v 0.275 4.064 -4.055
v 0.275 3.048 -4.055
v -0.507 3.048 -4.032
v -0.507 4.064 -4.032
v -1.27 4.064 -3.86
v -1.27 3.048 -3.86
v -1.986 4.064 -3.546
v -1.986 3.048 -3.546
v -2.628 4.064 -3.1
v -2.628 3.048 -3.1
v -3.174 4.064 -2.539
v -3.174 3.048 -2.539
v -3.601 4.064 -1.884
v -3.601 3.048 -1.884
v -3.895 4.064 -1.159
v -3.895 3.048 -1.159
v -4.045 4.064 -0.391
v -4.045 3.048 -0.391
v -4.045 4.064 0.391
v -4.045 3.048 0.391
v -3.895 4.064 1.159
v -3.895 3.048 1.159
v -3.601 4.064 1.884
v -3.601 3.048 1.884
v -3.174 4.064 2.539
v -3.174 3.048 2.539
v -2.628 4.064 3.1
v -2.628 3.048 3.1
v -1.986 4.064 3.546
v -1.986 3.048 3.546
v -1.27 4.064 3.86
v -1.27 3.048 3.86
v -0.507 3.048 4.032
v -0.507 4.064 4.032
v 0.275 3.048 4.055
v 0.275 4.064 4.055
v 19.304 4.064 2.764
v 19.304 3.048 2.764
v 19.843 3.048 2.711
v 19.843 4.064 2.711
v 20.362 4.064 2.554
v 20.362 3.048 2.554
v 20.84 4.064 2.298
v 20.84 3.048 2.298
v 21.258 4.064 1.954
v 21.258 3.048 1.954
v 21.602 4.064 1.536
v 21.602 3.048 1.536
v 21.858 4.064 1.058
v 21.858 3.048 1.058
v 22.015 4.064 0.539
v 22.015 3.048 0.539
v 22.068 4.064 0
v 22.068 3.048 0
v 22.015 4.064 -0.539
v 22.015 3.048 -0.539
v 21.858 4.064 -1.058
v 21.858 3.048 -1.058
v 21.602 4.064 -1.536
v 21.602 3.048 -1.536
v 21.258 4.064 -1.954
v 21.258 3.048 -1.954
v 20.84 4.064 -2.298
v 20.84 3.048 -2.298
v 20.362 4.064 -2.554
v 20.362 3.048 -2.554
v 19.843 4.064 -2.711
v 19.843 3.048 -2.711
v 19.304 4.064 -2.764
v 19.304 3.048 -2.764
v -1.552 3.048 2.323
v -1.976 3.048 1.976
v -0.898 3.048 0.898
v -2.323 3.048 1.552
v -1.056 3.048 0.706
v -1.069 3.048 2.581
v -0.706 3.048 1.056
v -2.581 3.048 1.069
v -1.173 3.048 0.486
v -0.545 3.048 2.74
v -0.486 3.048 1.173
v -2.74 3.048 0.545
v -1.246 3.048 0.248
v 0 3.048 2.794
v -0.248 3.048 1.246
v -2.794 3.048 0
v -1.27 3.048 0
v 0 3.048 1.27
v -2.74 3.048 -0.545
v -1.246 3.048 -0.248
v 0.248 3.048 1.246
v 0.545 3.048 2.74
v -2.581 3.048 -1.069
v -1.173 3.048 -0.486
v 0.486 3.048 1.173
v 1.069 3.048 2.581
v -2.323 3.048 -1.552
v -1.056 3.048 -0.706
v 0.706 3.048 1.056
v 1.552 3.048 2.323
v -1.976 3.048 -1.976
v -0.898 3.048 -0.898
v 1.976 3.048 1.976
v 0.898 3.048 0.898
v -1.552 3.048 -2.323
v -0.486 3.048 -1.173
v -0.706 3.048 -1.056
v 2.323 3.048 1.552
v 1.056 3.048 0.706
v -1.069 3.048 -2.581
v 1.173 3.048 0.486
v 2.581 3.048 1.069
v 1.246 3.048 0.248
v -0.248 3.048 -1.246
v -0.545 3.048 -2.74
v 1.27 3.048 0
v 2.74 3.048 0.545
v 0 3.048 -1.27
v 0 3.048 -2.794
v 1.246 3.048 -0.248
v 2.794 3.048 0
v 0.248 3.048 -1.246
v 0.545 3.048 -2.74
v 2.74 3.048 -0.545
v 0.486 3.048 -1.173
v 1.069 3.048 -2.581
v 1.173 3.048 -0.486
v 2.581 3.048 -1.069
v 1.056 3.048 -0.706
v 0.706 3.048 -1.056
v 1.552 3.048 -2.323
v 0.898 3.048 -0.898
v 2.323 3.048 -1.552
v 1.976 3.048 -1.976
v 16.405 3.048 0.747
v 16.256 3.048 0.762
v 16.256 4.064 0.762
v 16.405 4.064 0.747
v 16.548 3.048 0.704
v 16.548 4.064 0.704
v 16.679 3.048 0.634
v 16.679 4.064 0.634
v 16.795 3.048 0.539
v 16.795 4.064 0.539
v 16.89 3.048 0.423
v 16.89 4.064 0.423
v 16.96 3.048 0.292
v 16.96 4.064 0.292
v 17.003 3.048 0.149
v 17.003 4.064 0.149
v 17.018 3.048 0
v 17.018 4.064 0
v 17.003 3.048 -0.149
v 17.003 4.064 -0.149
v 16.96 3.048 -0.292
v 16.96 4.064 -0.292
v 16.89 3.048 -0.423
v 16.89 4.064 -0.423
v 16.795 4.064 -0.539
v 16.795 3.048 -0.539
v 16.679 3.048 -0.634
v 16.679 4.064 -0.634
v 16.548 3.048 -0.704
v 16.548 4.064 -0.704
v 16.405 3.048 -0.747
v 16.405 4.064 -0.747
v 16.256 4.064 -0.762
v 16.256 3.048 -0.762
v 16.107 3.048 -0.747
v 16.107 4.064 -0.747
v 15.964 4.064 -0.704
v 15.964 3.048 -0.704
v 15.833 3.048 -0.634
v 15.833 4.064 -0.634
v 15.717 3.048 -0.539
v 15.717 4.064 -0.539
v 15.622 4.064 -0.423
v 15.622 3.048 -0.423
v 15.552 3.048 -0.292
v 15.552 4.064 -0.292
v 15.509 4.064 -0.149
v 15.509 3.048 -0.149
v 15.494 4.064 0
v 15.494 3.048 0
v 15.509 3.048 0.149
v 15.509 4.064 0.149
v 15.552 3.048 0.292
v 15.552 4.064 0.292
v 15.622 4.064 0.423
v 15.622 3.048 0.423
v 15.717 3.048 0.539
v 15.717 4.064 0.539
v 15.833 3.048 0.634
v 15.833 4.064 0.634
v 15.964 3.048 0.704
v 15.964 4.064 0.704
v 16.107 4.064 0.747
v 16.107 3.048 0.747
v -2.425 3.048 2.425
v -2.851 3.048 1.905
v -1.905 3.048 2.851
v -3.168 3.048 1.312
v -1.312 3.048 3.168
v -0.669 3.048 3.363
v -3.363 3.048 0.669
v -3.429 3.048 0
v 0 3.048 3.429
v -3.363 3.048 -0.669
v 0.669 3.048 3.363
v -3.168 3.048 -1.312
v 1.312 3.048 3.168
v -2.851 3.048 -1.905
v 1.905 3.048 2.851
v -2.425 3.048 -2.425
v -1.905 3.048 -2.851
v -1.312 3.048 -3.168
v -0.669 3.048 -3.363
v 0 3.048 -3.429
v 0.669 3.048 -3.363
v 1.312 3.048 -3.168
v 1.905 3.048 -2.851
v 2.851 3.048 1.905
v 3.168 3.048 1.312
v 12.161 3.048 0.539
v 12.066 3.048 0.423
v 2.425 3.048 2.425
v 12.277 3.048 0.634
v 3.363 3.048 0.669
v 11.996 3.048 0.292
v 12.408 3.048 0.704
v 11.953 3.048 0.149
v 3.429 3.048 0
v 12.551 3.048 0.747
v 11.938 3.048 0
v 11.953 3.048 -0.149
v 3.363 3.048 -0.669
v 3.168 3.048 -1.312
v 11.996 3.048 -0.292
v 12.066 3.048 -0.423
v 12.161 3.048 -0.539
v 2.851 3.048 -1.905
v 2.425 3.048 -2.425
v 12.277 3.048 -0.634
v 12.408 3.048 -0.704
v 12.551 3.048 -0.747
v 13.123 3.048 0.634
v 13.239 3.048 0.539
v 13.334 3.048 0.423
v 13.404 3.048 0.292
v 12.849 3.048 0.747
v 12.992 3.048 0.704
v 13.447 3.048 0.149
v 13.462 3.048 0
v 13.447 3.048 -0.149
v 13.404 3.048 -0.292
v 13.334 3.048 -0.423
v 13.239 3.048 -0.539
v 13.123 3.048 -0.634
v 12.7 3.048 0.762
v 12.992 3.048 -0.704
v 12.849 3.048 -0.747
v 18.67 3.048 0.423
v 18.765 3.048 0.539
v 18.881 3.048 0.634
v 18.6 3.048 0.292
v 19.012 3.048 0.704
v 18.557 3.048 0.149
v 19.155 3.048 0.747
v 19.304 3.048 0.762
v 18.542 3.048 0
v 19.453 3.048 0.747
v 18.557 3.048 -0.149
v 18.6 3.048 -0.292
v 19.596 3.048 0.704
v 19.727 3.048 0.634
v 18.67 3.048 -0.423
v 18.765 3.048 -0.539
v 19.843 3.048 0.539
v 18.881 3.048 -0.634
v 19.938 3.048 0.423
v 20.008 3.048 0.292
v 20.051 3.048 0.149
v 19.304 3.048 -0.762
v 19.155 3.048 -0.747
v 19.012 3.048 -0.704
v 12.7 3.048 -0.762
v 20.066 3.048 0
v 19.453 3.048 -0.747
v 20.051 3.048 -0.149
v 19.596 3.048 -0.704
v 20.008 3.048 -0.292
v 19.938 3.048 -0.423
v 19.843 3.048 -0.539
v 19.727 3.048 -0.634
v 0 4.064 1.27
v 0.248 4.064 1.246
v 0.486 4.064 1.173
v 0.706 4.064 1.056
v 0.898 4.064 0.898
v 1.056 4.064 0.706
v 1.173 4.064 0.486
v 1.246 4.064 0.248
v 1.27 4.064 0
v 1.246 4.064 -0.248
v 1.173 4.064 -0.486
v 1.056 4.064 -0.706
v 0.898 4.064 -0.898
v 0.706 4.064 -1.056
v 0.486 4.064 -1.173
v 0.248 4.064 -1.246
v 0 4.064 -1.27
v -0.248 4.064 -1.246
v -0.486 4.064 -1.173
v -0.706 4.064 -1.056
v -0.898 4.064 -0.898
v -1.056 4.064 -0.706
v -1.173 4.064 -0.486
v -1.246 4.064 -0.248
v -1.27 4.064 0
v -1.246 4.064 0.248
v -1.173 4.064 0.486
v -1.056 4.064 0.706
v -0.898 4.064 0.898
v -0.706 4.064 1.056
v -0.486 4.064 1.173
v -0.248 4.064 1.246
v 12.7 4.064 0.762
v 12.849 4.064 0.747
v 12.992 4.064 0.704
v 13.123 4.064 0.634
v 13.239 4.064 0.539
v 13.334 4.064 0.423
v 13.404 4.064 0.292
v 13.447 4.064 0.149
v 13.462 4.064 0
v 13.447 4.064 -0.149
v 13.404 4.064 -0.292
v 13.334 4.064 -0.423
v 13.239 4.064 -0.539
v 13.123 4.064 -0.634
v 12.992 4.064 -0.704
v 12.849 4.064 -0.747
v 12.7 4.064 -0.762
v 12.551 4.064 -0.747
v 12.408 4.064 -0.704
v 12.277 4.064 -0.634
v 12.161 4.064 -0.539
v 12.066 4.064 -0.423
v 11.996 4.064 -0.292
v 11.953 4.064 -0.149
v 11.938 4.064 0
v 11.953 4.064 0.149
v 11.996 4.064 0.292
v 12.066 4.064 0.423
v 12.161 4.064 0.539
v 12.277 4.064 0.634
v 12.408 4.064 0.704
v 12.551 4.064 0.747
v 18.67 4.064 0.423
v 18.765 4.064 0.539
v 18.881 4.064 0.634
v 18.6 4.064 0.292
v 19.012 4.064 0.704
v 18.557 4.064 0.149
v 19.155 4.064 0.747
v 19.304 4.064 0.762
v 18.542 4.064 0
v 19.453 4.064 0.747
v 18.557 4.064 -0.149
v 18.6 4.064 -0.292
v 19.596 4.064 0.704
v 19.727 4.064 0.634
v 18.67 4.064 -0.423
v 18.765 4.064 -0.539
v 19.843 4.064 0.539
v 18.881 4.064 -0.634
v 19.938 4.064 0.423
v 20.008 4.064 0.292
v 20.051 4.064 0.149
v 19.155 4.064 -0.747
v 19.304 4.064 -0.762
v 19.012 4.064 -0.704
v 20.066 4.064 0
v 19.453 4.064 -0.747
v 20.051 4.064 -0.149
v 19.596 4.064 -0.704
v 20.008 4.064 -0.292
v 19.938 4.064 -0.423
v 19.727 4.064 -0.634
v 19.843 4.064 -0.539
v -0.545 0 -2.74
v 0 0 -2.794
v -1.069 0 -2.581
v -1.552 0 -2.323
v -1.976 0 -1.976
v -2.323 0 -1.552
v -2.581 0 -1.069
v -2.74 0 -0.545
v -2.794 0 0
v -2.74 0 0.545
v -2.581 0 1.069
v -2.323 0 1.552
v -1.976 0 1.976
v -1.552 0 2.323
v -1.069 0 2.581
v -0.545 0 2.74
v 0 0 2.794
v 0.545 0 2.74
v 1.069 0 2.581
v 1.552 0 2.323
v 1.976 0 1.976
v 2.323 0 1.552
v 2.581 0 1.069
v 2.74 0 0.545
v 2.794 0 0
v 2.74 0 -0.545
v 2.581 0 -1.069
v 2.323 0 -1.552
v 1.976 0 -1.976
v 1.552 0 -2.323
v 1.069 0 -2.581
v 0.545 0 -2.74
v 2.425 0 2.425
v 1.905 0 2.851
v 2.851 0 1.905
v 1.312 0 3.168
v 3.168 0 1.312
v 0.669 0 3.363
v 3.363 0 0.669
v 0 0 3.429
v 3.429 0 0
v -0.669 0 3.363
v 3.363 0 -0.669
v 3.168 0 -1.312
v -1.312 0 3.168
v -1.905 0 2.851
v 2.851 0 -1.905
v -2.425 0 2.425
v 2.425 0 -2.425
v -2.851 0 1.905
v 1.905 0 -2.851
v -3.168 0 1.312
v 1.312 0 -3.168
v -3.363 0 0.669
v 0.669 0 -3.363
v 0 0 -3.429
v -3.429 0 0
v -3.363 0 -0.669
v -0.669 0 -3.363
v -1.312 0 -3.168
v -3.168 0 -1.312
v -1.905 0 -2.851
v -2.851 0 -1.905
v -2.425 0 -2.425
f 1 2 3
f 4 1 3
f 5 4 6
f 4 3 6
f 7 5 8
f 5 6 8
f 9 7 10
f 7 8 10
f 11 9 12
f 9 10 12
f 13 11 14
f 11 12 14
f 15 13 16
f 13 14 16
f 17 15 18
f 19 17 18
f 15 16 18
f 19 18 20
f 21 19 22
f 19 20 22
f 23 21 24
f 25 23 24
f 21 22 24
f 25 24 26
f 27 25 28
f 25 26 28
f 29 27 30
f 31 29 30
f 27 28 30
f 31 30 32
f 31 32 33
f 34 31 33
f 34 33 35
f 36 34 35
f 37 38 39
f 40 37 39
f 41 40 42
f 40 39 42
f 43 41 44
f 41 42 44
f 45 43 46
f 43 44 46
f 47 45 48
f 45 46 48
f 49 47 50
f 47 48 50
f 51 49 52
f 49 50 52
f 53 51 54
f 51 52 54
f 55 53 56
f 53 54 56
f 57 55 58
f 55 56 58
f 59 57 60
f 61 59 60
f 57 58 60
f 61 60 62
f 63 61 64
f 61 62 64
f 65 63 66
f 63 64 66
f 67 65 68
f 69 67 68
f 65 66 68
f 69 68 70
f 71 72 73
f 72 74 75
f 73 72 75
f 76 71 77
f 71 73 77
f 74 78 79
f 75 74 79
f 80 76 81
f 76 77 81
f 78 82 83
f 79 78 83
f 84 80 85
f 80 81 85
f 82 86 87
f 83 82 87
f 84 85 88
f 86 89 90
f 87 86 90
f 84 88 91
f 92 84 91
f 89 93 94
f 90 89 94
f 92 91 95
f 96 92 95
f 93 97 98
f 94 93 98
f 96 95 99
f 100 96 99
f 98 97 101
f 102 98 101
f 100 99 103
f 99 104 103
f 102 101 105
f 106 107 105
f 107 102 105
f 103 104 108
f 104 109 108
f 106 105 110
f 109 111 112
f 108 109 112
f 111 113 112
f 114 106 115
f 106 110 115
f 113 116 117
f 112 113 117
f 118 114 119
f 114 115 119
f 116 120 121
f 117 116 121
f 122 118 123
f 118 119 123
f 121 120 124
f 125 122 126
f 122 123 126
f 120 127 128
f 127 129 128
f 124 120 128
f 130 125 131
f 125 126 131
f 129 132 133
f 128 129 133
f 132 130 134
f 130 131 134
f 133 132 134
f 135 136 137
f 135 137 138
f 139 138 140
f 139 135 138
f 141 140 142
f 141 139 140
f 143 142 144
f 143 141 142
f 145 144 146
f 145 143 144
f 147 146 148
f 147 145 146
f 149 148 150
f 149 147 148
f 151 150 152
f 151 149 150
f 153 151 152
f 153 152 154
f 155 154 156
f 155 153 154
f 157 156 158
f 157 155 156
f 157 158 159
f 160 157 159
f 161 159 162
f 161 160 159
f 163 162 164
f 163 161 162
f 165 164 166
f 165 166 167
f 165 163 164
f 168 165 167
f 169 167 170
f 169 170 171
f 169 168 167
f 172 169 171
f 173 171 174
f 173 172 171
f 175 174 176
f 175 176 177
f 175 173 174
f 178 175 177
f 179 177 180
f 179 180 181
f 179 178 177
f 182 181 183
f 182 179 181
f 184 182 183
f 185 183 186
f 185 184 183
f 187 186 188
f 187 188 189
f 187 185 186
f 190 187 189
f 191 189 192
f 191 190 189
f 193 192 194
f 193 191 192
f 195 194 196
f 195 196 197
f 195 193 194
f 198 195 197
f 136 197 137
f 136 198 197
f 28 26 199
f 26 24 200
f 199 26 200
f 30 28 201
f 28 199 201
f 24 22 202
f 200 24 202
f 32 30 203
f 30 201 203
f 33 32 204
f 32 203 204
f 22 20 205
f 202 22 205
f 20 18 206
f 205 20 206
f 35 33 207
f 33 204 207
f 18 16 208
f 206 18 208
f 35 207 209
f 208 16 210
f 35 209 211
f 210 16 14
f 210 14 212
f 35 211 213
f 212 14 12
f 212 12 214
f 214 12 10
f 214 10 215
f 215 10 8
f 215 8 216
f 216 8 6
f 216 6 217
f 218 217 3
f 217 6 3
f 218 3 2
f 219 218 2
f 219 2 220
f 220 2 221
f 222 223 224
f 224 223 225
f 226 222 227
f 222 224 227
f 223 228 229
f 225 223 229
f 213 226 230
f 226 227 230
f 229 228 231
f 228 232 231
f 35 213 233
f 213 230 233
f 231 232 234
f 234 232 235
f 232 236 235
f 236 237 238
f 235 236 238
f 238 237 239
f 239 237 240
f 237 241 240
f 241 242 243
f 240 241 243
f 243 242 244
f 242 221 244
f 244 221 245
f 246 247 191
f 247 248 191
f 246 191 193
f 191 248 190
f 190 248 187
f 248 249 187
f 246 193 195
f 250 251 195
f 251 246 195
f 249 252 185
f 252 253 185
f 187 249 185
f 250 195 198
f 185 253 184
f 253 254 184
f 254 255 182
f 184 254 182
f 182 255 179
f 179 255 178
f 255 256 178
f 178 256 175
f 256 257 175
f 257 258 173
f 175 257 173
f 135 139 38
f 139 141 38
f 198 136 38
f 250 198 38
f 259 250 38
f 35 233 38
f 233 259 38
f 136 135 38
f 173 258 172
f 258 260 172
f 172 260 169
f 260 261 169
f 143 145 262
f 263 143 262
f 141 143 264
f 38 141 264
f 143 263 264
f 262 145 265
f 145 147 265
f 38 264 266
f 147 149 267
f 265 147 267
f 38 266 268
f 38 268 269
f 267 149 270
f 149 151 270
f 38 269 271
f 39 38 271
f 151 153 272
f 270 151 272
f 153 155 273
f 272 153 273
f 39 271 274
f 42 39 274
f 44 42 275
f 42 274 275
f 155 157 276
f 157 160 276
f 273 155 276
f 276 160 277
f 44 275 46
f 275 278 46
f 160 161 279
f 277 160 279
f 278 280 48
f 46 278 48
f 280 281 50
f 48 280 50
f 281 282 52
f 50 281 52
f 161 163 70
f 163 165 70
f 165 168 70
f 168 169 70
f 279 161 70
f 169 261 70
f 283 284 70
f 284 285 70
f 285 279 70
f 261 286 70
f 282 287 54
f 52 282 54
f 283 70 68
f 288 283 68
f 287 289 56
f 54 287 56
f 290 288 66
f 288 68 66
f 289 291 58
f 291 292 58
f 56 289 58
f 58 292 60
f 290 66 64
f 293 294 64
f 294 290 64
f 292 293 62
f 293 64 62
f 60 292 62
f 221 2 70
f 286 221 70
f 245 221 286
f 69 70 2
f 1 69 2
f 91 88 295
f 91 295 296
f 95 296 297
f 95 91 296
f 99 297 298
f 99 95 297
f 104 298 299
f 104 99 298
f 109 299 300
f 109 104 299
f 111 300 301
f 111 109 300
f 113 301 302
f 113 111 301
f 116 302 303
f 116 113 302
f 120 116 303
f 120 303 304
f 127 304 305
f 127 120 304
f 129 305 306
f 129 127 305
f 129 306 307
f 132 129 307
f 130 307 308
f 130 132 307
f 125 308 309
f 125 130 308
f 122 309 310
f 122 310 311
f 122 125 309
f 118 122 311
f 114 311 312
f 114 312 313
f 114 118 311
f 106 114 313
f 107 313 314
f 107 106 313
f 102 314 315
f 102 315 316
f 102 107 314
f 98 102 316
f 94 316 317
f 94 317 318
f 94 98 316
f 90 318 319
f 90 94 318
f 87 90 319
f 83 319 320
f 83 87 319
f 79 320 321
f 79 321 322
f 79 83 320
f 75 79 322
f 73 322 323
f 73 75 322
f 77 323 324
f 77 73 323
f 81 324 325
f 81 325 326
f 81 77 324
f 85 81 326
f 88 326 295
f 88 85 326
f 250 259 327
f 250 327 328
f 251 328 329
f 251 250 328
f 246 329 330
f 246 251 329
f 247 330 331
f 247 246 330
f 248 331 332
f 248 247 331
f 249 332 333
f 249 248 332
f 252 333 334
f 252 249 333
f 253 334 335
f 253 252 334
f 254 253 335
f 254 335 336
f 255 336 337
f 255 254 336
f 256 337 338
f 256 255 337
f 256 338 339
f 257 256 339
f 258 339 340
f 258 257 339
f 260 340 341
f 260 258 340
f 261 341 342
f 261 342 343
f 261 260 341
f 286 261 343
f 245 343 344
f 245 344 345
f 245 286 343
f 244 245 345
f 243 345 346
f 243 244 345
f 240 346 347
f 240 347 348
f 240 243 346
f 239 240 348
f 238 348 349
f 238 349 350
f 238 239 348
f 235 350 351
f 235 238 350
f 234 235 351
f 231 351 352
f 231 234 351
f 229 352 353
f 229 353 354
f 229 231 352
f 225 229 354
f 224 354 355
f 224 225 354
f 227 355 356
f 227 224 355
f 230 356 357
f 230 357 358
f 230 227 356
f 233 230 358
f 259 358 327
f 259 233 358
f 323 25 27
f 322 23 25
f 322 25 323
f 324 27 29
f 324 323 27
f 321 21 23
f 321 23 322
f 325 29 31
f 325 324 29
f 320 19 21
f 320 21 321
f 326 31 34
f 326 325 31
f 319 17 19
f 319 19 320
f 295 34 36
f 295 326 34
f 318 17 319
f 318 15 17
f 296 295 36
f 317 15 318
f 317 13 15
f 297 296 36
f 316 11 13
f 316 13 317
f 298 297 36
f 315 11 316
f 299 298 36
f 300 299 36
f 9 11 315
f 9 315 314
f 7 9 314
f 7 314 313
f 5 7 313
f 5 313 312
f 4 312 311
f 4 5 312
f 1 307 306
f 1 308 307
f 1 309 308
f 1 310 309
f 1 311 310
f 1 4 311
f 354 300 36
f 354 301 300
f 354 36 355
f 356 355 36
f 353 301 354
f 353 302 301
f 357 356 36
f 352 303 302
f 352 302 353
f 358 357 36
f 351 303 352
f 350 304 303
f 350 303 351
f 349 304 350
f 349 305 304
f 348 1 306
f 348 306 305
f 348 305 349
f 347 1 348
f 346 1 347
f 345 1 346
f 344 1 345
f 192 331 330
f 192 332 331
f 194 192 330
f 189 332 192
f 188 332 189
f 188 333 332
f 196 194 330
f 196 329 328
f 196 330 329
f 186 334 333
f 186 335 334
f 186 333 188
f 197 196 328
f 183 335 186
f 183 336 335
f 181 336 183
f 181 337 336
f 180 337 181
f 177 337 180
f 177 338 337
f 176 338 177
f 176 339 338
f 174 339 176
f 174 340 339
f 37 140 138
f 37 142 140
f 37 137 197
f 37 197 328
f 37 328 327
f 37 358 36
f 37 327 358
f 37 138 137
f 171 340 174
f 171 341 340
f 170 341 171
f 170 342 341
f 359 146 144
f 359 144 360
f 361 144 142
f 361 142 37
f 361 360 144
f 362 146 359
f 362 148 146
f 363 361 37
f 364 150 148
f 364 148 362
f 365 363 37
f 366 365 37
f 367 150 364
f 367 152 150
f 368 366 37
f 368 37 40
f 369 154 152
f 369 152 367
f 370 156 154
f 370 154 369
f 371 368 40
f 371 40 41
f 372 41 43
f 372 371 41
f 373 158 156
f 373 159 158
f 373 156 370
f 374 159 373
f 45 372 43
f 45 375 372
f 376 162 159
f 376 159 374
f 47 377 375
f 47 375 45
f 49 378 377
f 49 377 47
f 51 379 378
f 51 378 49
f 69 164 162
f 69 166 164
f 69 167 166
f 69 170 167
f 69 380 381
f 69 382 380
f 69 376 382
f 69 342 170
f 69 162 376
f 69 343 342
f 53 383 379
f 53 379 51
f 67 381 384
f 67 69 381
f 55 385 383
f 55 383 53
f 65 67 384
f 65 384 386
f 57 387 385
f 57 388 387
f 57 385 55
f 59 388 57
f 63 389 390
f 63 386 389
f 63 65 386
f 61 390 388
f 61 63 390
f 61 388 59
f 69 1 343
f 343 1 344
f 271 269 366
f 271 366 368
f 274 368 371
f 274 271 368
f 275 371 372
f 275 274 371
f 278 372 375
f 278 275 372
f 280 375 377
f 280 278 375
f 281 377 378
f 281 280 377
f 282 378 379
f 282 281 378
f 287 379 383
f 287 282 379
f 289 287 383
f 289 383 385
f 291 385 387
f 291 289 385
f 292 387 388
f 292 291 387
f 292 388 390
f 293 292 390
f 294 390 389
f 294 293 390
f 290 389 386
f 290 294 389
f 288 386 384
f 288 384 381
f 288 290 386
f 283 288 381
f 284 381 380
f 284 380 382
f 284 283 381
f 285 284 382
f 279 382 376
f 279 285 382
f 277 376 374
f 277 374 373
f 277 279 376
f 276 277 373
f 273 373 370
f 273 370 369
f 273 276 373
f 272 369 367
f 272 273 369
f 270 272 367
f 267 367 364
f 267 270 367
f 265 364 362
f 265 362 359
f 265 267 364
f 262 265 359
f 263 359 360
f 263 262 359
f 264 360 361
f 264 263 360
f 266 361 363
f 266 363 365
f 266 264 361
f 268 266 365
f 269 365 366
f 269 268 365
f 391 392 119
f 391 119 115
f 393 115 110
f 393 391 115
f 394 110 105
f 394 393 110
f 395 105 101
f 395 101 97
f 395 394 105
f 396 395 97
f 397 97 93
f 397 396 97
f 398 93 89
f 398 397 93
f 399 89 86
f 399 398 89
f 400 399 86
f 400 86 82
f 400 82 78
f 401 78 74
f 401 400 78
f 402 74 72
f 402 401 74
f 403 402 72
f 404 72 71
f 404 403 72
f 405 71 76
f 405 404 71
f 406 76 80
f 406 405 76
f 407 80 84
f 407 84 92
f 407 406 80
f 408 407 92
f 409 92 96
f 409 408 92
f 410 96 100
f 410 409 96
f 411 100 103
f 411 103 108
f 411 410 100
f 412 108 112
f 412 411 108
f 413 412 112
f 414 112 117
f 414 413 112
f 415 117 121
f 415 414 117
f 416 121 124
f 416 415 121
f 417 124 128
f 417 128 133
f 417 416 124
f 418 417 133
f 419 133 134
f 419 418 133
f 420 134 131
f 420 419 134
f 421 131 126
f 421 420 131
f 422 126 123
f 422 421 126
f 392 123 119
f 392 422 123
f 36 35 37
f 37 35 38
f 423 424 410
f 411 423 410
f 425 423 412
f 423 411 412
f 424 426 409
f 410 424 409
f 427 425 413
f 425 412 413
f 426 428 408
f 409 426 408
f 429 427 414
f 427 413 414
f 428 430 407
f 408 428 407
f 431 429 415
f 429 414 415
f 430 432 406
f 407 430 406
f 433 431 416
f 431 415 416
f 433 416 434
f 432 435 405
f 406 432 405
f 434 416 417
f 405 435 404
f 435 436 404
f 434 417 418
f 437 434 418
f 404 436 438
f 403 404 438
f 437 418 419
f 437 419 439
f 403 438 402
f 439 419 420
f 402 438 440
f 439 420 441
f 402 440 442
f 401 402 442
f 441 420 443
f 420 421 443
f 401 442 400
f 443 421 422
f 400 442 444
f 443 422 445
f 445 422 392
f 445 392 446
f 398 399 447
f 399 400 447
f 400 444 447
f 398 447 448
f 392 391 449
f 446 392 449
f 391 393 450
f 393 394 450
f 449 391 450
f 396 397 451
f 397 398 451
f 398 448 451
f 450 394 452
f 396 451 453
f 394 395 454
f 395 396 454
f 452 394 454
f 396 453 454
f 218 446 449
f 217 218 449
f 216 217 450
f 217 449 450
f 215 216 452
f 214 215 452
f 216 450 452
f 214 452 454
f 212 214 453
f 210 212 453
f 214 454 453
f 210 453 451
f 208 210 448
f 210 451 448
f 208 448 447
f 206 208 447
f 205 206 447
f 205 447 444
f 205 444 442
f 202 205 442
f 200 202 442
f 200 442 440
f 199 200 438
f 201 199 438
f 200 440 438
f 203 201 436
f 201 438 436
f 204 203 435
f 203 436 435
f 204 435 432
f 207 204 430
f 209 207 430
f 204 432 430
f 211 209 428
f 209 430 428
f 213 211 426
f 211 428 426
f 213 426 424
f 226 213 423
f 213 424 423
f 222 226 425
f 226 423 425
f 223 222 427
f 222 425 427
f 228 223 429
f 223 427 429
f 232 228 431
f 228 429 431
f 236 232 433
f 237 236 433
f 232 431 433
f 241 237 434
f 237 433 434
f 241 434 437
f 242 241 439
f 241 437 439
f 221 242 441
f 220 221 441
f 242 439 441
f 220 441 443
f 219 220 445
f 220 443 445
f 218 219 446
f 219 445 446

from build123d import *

# Parameters (mm, degrees)
SKETCH5_R           = 3.429
SKETCH5_R_2         = 2.794
BOSS_EXTRUDE3_DEPTH = 3.048
SKETCH6_R           = 0.762
SKETCH6_R_2         = 1.27
BOSS_EXTRUDE4_DEPTH = 1.016


with BuildPart() as part:
    # Sketch5 → Boss-Extrude3 (new body)
    with BuildSketch(Plane(origin=(0, 0, 0), x_dir=(1, 0, 0), z_dir=(0, 1, 0))):
        with Locations(Location((0, 0, 0), (0, 0, 90))):
            Circle(SKETCH5_R)
        with Locations(Location((0, 0, 0), (0, 0, 90))):
            Circle(SKETCH5_R_2, mode=Mode.SUBTRACT)
    extrude(amount=BOSS_EXTRUDE3_DEPTH)

    # Sketch6 → Boss-Extrude4 (add)
    with BuildSketch(Plane(origin=(0, 3.048, 0), x_dir=(1, 0, 0), z_dir=(0, 1, 0))):
        with BuildLine():
            ThreePointArc((0.275010076, 4.054684385), (-4.064, 0), (0.275010076, -4.054684385))
            Line((0.275010076, -4.054684385), (19.304, -2.764037947))
            ThreePointArc((19.304, -2.764037947), (22.068037947, 0), (19.304, 2.764037947))
            Line((19.304, 2.764037947), (0.275010076, 4.054684385))
        make_face()
        with Locations(Location((16.256, 0, 0), (0, 0, 270))):
            Circle(SKETCH6_R, mode=Mode.SUBTRACT)
        with Locations(Location((12.7, 0, 0), (0, 0, 270))):
            Circle(SKETCH6_R, mode=Mode.SUBTRACT)
        with Locations(Location((0, 0, 0), (0, 0, 270))):
            Circle(SKETCH6_R_2, mode=Mode.SUBTRACT)
        with Locations(Location((19.304, 0, 0), (0, 0, 270))):
            Circle(SKETCH6_R, mode=Mode.SUBTRACT)
    extrude(amount=BOSS_EXTRUDE4_DEPTH)


solid = part.part
